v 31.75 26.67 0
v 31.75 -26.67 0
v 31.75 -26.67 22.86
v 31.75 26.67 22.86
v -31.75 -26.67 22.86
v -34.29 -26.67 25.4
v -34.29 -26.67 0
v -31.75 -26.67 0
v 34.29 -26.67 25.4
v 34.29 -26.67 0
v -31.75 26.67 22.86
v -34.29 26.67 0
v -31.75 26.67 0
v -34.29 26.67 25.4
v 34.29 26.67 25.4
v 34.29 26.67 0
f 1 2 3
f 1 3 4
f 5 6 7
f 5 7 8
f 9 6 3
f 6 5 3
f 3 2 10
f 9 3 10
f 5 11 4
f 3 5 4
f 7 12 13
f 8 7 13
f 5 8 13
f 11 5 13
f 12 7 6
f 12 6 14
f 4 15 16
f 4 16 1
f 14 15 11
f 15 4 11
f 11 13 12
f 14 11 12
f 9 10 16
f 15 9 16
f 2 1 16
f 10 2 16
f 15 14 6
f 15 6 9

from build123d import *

# Parameters (mm, degrees)
F0_W     = 2.54
F0_H     = 53.34
F0_W_2   = 58.42
F1_DEPTH = 25.4
F2_DEPTH = 22.86
F3_DEPTH = 22.86


with BuildPart() as f1:
    # F0 (on Top) → F1 (new body)
    with BuildSketch(Plane.XY):
        with Locations((-33.02, 0)):
            Rectangle(F0_W, F0_H)
        with Locations((-30.48, 0)):
            Rectangle(F0_W, F0_H)
        Rectangle(F0_W_2, F0_H)
        with Locations((30.48, 0)):
            Rectangle(F0_W, F0_H)
        with Locations((33.02, 0)):
            Rectangle(F0_W, F0_H)
    extrude(amount=F1_DEPTH)

    # F0 (on Top) → F2 (cut)
    with BuildSketch(Plane.XY):
        with Locations((-30.48, 0)):
            Rectangle(F0_W, F0_H)
        with Locations((30.48, 0)):
            Rectangle(F0_W, F0_H)
    extrude(amount=F2_DEPTH, mode=Mode.SUBTRACT)

    # F0 (on Top) → F3 (cut)
    with BuildSketch(Plane.XY):
        Rectangle(F0_W_2, F0_H)
    extrude(amount=F3_DEPTH, mode=Mode.SUBTRACT)


solid = f1.part
